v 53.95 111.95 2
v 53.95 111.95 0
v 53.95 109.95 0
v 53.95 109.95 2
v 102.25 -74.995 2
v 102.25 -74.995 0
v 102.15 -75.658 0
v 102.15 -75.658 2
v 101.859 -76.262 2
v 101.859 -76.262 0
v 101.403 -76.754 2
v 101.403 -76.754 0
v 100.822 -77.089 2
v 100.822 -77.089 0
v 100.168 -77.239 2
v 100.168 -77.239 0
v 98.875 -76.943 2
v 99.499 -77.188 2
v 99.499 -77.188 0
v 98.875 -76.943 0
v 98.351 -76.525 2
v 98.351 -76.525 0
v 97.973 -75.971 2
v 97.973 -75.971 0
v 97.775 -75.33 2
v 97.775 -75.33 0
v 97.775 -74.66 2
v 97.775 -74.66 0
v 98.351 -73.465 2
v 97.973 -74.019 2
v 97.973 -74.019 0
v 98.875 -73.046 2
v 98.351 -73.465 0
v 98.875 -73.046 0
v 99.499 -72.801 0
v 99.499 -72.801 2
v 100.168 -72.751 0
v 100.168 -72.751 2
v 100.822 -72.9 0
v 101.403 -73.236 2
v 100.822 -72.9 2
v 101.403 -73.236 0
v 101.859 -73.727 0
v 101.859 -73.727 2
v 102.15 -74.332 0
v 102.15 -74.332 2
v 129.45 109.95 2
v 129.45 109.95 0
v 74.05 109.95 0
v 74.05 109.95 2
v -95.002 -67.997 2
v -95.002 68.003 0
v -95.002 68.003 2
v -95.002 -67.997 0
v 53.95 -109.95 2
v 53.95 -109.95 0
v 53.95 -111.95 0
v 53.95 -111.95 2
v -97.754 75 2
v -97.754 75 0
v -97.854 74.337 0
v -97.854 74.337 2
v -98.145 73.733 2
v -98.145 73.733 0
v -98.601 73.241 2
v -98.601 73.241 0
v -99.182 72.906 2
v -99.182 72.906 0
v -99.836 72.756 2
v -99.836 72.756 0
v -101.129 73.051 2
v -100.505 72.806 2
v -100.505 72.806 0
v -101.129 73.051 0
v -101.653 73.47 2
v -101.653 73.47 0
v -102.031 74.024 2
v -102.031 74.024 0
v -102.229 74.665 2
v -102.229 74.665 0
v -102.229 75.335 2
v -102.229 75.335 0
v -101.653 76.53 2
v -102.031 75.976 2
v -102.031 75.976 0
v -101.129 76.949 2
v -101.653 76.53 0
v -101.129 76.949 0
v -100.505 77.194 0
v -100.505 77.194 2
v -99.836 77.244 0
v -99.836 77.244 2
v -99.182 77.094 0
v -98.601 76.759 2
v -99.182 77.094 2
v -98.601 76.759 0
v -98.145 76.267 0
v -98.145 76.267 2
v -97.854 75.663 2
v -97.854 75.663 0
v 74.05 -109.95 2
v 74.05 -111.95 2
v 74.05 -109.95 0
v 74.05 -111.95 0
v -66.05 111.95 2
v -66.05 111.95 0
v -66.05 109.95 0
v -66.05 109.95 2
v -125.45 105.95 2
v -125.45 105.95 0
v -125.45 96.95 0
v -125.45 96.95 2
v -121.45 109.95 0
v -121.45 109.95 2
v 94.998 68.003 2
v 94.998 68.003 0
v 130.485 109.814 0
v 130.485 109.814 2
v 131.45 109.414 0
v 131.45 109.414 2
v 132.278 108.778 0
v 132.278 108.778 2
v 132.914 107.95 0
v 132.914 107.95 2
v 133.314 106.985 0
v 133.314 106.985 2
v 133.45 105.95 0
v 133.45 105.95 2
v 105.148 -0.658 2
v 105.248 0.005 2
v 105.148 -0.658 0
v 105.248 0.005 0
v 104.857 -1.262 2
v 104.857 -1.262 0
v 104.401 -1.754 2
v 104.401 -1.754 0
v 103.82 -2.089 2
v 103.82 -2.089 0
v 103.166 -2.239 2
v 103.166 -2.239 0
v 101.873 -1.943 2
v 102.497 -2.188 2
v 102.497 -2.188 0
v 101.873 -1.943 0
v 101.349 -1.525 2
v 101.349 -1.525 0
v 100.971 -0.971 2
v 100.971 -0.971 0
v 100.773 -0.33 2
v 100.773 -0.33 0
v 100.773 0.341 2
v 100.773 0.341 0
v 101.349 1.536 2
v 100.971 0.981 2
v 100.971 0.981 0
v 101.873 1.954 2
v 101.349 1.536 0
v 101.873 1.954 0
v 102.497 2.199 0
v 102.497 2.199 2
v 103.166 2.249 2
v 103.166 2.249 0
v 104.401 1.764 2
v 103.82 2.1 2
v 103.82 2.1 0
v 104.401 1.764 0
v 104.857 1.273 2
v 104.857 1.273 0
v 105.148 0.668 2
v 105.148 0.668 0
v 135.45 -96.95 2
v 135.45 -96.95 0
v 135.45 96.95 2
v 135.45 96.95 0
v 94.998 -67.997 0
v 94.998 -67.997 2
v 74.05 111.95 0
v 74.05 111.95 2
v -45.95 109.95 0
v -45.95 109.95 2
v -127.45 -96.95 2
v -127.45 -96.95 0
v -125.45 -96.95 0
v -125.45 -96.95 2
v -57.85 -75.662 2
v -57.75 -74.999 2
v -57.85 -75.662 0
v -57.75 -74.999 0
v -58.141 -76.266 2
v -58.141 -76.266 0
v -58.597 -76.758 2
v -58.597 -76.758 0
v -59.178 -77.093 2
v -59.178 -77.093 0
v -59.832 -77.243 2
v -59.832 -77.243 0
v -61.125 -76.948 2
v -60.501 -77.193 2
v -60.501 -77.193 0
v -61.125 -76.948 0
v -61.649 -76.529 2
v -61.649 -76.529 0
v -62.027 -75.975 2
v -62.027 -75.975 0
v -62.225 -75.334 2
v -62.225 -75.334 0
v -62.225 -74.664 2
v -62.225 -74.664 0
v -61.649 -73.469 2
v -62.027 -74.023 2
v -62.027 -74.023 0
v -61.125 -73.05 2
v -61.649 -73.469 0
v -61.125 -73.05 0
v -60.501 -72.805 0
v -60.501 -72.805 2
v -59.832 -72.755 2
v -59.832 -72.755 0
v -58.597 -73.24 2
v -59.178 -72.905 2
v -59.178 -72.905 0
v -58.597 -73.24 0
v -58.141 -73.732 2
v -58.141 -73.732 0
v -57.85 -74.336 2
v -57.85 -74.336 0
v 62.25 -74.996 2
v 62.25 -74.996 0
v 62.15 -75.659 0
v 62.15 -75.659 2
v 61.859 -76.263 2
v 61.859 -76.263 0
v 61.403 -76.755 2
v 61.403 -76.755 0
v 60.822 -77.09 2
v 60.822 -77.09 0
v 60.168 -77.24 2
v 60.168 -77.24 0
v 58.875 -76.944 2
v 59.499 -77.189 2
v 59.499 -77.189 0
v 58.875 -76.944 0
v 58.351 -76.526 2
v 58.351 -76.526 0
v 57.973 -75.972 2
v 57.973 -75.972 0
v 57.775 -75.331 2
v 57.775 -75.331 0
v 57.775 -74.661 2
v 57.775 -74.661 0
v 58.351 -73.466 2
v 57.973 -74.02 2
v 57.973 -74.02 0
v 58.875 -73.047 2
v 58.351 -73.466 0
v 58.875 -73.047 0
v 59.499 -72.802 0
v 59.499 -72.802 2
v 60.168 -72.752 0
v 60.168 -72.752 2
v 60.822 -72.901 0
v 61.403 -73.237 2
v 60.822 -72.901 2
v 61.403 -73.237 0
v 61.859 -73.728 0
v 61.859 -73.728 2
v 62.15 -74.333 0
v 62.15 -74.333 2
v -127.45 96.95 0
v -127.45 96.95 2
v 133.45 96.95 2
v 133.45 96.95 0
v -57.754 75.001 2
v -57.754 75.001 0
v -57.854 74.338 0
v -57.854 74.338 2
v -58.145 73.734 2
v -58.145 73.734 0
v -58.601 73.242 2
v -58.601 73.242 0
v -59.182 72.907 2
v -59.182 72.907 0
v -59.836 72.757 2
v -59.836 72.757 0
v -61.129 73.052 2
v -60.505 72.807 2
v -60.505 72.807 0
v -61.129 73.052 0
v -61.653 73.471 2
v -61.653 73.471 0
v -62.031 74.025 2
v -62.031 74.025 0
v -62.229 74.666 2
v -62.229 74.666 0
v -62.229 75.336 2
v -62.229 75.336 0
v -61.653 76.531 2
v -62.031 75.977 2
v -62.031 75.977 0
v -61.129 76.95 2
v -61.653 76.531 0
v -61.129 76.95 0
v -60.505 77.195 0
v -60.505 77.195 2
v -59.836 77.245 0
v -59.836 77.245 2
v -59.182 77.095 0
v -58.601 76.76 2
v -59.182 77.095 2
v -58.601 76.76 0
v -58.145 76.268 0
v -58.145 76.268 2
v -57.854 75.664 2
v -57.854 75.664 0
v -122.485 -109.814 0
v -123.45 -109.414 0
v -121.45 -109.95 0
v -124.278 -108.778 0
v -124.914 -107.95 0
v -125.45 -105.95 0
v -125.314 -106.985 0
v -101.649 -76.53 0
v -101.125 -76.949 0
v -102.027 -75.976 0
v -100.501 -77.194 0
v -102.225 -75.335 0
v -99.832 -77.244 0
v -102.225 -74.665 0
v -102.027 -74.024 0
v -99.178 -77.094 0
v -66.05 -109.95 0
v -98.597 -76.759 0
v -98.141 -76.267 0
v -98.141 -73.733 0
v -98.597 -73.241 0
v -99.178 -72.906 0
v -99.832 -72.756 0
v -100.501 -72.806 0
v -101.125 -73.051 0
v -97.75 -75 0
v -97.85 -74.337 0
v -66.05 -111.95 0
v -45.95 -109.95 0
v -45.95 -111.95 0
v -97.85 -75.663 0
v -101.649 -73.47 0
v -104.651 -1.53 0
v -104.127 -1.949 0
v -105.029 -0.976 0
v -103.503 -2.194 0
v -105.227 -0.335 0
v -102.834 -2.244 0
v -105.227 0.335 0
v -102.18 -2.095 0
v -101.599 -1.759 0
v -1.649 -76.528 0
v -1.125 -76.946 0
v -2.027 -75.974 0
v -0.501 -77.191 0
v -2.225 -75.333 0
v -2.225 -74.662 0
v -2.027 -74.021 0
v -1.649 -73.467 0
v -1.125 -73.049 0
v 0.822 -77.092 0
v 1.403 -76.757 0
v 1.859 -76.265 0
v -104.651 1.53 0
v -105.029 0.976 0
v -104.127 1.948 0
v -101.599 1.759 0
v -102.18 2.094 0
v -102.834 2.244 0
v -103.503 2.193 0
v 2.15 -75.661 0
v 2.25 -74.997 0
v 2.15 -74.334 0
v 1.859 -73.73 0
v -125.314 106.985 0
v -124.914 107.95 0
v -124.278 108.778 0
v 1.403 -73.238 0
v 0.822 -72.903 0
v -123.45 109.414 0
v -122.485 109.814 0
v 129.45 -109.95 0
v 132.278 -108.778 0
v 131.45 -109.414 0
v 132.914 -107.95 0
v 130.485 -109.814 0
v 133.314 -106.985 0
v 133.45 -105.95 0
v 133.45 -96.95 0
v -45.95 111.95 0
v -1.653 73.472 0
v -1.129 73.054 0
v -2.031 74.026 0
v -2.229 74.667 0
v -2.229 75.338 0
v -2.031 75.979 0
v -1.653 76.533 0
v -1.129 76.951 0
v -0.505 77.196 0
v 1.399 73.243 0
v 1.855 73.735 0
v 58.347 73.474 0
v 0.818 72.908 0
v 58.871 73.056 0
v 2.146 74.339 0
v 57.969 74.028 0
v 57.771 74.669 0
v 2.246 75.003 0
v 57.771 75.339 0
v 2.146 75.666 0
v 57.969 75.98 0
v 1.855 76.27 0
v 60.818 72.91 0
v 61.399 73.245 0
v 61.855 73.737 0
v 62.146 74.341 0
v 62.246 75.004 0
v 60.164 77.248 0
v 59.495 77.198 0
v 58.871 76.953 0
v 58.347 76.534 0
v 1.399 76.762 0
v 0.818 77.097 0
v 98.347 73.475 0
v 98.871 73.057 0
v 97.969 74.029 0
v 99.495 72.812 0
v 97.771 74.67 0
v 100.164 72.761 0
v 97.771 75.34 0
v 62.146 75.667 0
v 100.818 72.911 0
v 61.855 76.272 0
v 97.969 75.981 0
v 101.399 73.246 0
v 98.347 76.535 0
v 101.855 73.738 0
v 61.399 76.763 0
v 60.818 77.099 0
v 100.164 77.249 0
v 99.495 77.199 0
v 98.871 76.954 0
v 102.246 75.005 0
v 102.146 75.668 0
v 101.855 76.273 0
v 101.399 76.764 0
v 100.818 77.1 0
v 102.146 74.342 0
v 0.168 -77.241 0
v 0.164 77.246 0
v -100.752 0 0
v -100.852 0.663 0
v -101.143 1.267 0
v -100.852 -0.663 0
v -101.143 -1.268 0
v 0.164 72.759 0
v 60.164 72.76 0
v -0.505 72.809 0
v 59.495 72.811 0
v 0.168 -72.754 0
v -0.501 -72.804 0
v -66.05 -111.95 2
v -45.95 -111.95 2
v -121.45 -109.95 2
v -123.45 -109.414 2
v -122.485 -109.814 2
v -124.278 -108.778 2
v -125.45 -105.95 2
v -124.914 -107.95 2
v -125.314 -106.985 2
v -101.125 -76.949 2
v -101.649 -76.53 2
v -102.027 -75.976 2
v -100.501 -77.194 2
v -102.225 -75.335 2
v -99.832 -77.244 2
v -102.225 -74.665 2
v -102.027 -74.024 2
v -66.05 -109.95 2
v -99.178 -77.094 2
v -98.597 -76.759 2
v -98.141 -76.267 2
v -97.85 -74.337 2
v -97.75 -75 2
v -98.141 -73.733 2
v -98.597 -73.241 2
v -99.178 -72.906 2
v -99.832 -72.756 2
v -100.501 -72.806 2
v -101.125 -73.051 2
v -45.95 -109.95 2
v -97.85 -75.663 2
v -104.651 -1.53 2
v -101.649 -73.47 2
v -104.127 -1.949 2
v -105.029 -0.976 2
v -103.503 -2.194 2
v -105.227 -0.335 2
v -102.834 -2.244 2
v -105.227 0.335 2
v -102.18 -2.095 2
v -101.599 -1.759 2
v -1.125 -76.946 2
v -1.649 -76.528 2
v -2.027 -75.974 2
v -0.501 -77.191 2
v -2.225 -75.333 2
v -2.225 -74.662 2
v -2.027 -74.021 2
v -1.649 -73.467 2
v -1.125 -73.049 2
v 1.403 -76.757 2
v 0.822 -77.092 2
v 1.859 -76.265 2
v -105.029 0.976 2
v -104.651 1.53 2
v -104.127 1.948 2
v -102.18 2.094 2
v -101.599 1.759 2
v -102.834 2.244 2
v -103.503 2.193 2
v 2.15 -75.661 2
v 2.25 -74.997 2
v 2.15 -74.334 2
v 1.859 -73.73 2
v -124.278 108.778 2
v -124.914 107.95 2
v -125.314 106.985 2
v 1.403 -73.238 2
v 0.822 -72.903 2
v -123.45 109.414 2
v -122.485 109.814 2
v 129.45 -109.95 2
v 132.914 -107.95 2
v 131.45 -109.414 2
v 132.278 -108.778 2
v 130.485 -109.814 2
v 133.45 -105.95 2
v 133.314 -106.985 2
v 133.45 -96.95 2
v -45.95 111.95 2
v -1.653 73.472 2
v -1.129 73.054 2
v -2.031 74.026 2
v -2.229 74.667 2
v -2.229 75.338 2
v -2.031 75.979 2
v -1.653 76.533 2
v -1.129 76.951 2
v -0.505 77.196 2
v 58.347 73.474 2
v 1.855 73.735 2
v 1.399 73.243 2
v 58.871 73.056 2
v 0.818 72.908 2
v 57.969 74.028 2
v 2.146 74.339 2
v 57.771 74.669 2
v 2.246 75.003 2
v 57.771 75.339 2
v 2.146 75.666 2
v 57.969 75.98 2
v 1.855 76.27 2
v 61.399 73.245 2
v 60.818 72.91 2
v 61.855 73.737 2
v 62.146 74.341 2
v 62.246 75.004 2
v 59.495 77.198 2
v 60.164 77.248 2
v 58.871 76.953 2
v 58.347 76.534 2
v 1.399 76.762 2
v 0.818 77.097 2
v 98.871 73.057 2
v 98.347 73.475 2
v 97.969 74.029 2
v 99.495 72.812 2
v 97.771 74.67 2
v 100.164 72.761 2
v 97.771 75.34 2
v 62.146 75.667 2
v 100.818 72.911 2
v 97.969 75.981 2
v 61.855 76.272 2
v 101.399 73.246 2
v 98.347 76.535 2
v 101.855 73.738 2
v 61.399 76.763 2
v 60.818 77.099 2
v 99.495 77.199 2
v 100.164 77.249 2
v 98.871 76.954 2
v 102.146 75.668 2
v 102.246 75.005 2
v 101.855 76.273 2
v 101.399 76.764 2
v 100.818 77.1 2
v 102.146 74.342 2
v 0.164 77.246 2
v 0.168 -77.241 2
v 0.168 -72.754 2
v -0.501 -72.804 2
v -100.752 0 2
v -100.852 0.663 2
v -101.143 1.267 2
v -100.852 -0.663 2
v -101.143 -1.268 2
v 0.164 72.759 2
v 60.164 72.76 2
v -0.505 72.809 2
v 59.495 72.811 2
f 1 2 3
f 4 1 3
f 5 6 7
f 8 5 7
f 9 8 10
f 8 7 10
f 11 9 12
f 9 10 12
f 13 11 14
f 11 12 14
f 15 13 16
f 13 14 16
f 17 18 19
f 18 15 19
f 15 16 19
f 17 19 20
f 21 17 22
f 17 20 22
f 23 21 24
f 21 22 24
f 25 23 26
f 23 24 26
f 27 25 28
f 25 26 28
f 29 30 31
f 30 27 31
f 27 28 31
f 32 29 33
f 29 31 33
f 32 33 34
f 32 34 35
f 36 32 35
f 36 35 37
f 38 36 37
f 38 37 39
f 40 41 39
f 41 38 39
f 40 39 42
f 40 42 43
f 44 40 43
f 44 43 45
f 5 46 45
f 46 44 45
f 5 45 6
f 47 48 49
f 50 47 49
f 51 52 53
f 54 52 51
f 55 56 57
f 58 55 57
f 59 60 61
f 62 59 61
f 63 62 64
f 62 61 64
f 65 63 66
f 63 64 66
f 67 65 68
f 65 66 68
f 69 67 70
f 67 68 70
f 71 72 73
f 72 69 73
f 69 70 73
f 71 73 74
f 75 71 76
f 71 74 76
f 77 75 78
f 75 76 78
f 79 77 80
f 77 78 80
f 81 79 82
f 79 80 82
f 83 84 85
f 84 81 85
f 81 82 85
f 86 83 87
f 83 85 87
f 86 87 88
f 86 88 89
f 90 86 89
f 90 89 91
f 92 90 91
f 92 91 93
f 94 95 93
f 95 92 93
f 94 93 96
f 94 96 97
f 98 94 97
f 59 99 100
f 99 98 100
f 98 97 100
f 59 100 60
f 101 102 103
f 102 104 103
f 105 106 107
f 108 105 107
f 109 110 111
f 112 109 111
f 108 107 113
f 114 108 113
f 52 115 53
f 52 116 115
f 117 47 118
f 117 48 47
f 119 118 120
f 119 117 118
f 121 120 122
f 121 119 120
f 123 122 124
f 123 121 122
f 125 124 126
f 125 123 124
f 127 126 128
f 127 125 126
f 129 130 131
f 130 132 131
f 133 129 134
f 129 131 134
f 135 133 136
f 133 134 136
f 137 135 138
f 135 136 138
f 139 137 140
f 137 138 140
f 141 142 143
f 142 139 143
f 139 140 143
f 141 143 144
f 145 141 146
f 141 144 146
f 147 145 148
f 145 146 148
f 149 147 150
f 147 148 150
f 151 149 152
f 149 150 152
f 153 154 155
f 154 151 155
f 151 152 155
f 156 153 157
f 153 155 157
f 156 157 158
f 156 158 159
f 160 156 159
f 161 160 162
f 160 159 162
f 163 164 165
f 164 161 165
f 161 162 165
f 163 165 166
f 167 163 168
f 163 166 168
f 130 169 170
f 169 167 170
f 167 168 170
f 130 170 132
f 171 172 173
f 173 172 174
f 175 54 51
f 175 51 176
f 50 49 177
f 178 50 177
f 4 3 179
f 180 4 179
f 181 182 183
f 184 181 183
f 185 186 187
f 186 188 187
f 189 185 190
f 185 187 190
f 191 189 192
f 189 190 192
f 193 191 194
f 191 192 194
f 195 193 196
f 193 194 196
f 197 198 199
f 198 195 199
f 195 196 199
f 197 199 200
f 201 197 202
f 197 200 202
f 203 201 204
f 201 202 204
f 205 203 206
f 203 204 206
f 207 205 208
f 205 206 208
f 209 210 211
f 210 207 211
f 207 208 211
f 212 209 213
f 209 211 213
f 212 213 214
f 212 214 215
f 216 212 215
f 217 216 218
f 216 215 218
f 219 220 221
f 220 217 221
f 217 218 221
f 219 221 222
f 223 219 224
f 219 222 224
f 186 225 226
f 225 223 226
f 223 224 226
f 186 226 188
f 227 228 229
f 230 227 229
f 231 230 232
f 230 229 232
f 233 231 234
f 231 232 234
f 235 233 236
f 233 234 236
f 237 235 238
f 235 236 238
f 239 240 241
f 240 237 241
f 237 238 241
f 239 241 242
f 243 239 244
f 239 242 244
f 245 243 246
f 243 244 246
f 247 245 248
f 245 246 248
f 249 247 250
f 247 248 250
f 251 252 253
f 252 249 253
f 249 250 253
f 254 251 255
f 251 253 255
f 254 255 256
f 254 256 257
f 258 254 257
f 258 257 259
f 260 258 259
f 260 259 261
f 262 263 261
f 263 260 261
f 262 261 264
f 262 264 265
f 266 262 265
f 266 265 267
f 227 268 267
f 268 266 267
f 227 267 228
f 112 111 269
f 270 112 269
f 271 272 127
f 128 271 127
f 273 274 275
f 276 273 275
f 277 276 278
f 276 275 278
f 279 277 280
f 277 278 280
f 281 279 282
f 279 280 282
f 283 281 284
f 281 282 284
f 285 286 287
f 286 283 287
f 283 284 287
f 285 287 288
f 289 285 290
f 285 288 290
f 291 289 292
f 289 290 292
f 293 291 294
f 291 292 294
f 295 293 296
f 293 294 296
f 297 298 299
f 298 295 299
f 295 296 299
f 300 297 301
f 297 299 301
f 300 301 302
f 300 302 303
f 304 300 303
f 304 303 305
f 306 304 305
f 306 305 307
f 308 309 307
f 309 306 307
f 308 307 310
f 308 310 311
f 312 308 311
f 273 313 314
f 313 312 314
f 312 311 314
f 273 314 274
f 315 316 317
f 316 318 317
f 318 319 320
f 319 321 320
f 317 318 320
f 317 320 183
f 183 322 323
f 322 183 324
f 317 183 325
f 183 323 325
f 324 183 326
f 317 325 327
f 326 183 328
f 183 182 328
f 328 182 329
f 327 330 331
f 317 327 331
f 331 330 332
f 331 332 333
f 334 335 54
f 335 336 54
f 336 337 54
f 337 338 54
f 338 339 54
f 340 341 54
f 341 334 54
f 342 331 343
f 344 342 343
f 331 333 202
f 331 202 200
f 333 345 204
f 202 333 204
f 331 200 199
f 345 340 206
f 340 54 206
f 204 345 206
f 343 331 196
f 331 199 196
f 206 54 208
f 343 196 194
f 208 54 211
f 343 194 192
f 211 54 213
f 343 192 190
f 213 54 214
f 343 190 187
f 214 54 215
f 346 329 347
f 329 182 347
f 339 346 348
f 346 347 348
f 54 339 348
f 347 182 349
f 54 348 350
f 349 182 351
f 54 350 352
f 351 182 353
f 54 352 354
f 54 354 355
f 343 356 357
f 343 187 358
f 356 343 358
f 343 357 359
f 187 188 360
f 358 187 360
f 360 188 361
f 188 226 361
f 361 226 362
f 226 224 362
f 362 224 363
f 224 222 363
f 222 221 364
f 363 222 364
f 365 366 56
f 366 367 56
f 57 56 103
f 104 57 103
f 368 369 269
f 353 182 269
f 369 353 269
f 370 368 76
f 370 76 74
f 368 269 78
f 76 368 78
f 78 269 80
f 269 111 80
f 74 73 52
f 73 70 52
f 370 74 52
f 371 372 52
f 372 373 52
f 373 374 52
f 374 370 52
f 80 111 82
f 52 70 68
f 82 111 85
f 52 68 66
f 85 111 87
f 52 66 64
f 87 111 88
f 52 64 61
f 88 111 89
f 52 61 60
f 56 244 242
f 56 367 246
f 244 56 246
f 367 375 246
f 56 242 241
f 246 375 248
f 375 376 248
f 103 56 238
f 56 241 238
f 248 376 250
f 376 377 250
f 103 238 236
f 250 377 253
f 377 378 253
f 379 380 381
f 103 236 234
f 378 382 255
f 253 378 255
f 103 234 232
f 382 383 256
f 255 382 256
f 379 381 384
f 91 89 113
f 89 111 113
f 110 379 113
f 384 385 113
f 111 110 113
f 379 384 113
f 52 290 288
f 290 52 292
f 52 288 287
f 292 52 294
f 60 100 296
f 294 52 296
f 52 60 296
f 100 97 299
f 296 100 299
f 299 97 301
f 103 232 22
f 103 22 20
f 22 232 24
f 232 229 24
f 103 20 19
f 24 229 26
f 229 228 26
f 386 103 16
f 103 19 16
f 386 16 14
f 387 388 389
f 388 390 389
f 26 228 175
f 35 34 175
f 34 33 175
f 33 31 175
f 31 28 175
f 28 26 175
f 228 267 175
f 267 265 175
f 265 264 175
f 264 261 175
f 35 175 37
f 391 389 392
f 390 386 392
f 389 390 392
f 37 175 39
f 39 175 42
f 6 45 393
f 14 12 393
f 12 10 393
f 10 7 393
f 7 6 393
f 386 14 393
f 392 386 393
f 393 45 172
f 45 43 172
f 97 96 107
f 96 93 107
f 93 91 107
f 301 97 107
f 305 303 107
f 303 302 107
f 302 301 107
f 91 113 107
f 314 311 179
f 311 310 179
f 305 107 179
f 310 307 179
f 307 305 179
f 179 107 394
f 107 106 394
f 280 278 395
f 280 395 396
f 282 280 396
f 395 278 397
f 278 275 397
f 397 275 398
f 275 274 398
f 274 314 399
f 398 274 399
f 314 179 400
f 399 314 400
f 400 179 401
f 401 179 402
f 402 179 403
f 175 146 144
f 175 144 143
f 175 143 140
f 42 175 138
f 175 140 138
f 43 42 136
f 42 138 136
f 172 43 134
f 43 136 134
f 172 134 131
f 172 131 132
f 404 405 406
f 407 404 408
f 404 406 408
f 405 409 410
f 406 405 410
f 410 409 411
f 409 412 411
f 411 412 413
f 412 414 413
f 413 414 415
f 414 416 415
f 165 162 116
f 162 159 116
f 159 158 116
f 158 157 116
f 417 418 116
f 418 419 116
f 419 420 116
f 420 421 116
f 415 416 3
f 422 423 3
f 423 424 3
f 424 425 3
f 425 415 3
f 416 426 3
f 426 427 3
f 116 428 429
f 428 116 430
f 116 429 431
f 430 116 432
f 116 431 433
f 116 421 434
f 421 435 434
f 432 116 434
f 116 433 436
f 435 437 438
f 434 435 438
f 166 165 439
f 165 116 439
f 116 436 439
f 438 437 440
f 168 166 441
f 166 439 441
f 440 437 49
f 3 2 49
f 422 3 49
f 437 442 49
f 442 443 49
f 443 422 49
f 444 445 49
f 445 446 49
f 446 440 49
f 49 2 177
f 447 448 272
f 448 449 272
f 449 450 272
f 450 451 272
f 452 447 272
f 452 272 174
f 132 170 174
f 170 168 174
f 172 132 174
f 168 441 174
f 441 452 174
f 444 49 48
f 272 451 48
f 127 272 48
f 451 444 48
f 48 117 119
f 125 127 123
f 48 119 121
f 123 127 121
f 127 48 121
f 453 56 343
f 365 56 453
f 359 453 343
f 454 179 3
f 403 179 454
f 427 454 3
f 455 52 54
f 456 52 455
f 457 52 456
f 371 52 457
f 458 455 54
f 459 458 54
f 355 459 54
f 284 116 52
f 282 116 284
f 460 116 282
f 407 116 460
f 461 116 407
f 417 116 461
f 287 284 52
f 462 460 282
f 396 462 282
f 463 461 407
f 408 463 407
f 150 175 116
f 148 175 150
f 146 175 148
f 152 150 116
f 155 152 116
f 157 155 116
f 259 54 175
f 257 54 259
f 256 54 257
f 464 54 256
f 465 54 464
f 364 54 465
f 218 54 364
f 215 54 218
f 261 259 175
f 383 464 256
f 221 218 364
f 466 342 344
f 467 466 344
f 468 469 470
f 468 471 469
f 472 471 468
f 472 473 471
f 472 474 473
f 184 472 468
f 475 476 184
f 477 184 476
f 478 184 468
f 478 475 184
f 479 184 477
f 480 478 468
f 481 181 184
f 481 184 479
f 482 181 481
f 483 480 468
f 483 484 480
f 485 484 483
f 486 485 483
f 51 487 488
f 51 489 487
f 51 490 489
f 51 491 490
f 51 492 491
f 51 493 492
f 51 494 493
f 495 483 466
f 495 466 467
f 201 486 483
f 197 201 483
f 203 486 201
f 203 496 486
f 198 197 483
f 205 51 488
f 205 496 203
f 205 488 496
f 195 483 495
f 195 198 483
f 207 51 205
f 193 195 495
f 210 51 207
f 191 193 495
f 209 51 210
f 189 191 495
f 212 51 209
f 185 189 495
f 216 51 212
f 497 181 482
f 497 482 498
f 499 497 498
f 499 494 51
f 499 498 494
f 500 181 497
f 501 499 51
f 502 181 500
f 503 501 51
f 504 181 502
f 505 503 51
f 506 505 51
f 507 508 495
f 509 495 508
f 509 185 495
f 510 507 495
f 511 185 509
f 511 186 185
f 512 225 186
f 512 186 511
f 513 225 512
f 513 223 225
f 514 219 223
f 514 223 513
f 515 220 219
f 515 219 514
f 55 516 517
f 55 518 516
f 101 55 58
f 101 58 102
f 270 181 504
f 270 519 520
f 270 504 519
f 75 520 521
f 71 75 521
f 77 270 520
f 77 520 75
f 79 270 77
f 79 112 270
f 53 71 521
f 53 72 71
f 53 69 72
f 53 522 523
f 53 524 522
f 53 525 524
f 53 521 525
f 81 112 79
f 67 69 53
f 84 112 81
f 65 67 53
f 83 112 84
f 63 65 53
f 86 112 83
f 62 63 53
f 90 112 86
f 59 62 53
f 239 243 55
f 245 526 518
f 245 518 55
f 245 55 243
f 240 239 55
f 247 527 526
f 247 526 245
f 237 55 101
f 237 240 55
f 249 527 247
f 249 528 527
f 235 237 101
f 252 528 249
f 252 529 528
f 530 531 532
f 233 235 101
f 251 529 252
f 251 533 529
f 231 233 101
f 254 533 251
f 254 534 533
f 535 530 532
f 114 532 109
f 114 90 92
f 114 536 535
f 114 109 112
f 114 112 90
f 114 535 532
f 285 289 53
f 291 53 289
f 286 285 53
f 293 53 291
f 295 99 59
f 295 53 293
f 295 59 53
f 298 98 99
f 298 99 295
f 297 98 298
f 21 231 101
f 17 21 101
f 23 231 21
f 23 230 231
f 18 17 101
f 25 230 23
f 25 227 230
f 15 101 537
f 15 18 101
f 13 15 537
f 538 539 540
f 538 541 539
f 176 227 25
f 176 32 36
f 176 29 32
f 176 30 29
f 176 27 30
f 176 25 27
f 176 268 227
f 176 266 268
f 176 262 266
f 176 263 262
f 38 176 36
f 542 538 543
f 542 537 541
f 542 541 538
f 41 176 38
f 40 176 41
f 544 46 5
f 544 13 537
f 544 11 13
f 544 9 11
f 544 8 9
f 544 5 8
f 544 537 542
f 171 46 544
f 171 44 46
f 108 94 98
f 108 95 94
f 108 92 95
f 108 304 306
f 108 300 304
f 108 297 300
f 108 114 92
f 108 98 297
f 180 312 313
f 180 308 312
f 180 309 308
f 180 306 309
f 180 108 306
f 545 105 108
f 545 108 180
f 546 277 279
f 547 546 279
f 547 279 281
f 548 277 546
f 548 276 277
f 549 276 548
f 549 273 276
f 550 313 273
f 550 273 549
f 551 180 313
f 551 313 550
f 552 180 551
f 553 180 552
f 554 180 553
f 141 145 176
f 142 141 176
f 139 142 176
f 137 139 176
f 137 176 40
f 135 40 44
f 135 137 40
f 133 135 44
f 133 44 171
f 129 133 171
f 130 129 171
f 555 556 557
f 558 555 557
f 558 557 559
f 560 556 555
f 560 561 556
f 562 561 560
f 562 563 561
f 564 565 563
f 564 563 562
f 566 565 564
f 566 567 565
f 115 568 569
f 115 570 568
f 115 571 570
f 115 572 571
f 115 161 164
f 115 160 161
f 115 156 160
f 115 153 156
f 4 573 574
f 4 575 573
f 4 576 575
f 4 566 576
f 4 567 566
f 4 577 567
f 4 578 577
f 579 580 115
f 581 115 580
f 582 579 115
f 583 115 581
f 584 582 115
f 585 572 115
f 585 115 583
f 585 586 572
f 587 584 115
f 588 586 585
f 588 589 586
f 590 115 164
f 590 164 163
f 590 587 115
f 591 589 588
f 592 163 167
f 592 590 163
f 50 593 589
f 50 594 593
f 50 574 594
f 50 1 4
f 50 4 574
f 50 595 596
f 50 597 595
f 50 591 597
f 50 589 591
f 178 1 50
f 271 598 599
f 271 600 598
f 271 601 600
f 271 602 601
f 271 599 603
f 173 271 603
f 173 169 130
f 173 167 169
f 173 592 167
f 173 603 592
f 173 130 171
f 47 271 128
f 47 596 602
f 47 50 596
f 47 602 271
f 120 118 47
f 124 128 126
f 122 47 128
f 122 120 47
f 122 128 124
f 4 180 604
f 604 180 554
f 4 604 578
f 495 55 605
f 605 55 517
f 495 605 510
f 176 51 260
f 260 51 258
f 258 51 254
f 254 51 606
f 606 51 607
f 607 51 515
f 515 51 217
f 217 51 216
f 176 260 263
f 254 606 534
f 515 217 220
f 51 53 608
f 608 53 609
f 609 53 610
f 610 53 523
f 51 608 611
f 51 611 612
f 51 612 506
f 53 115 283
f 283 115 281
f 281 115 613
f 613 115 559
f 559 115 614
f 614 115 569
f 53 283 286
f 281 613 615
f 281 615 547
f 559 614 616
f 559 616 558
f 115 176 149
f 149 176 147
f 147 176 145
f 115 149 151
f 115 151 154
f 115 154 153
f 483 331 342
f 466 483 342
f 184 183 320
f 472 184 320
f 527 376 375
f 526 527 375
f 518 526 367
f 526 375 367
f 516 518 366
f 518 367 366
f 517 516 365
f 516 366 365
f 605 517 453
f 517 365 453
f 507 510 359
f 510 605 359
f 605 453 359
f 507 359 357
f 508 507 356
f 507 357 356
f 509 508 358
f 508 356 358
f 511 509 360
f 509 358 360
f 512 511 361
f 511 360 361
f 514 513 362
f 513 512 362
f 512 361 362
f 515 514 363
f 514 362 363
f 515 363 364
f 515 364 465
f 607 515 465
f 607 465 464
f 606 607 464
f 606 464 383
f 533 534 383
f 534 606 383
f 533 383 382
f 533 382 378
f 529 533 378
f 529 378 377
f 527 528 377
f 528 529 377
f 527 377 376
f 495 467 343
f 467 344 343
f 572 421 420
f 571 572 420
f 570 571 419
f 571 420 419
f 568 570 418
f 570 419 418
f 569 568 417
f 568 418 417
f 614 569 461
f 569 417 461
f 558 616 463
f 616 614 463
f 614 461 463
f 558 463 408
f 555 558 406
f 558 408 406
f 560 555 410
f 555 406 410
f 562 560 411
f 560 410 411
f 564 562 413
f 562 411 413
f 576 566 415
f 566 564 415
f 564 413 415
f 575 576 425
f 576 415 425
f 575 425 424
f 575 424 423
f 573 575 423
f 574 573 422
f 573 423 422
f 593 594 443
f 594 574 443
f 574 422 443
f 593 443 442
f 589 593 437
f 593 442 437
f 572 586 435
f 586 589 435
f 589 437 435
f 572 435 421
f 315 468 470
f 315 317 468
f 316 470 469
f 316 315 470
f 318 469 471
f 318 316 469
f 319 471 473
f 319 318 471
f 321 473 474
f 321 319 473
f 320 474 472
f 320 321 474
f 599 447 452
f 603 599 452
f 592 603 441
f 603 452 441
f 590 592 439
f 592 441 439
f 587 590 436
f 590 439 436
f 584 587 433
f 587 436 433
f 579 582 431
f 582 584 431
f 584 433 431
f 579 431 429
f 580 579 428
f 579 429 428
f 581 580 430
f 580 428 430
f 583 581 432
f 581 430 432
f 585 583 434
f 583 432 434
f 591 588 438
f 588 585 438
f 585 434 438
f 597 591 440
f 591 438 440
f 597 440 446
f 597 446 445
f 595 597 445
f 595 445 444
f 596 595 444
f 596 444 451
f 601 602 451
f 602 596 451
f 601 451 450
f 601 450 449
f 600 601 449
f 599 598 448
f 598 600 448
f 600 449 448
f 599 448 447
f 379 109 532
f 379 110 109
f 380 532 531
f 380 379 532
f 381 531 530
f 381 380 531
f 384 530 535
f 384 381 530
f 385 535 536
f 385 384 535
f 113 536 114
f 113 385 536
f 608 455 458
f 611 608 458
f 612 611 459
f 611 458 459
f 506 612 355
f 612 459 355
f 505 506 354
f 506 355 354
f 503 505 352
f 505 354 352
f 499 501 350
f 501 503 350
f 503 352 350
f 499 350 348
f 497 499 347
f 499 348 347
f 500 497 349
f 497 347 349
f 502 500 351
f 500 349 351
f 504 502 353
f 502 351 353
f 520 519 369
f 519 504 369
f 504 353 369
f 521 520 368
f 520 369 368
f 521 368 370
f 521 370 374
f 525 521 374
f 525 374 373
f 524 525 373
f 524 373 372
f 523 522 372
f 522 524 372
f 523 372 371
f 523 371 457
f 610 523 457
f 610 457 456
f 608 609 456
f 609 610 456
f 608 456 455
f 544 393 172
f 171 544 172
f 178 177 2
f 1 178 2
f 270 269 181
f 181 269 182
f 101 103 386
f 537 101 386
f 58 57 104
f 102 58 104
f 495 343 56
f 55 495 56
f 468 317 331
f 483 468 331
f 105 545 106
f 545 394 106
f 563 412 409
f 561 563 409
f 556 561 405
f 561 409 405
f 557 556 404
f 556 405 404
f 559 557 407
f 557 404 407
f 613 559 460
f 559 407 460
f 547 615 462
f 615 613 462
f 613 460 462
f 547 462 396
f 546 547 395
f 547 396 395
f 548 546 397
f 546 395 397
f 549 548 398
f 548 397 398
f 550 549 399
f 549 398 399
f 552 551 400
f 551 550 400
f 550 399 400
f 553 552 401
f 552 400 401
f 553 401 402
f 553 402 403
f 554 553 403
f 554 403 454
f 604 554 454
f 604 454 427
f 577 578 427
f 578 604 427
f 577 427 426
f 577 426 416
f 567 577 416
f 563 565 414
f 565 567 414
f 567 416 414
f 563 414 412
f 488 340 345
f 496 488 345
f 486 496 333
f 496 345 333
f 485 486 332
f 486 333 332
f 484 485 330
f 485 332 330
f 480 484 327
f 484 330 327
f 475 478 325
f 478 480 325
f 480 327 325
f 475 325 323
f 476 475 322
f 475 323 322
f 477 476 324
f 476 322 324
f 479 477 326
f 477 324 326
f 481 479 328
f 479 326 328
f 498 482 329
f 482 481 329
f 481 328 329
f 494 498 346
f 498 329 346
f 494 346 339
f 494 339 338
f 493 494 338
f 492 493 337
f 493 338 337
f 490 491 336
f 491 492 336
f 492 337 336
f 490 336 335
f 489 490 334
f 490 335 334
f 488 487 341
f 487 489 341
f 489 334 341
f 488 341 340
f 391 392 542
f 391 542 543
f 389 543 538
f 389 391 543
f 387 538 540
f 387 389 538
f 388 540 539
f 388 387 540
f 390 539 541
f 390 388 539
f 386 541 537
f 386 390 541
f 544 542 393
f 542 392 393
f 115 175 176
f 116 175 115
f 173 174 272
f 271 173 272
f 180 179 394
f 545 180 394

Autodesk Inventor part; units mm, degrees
ref_plane "YZ Plane" through (0, 0, 0) normal (1, 0, 0) x (0, 1, 0)
ref_plane "XZ Plane" through (0, 0, 0) normal (0, 1, 0) x (-1, 0, 0)
ref_plane "XY Plane" through (0, 0, 0) normal (0, 0, 1) x (1, 0, 0)
ref_plane "Arbeitsebene1" through (0, 0, 0) normal (0, 0, 1) x (1, 0, 0)
sketch "Skizze1" plane through (0, 0, 0) normal (0, 0, 1) x (1, 0, 0)
  line L0 (53.9, 111.9999) -> (53.9, 109.9999) construction
  line L1 (53.9, 109.9999) -> (-45.9, 109.9999) construction
  line L2 (-45.9, 109.9999) -> (-45.9, 111.9999) construction
  line L3 (-66.1, 111.9999) -> (-66.1, 109.9999) construction
  line L4 (-66.1, 109.9999) -> (-123.5, 109.9999) construction
  arc A0 (-123.5, 109.9999) -> (-125.5, 107.9999) centre (-123.5, 107.9999) ccw construction
  line L5 (-125.5, 107.9999) -> (-125.5, 96.9999) construction
  line L6 (-125.5, 96.9999) -> (-127.5, 96.9999) construction
  line L7 (133.5, 96.9999) -> (133.5, 107.9999) construction
  arc A1 (133.5, 107.9999) -> (131.5, 109.9999) centre (131.5, 107.9999) ccw construction
  line L8 (131.5, 109.9999) -> (74.1, 109.9999) construction
  line L9 (74.1, 109.9999) -> (74.1, 111.9999) construction
  line L10 (135.5, 96.9999) -> (133.5, 96.9999) construction
  line L11 (-45.9, -111.9999) -> (-45.9, -109.9999) construction
  line L12 (-45.9, -109.9999) -> (53.9, -109.9999) construction
  line L13 (53.9, -109.9999) -> (53.9, -111.9999) construction
  line L14 (74.1, -111.9999) -> (74.1, -109.9999) construction
  line L15 (74.1, -109.9999) -> (131.5, -109.9999) construction
  arc A2 (131.5, -109.9999) -> (133.5, -107.9999) centre (131.5, -107.9999) ccw construction
  line L16 (133.5, -107.9999) -> (133.5, -96.9999) construction
  line L17 (133.5, -96.9999) -> (135.5, -96.9999) construction
  line L18 (-125.5, -96.9999) -> (-125.5, -107.9999) construction
  arc A3 (-125.5, -107.9999) -> (-123.5, -109.9999) centre (-123.5, -107.9999) ccw construction
  line L19 (-123.5, -109.9999) -> (-66.1, -109.9999) construction
  line L20 (-66.1, -109.9999) -> (-66.1, -111.9999) construction
  line L21 (-127.5, -96.9999) -> (-125.5, -96.9999) construction
  line L22 (135.5, -96.9999) -> (135.5, 96.9999) construction
  line L23 (74.1, 111.9999) -> (53.9, 111.9999) construction
  line L24 (-45.9, 111.9999) -> (-66.1, 111.9999) construction
  line L25 (-127.5, 96.9999) -> (-127.5, -96.9999) construction
  line L26 (-127.5, -109.9999) -> (-127.5, -111.9999) construction
  line L27 (-66.1, -111.9999) -> (-45.9, -111.9999) construction
  line L28 (53.9, -111.9999) -> (74.1, -111.9999) construction
  line L29 (135.45, 96.9499) -> (133.45, 96.9499)
  line L30 (133.45, 96.9499) -> (133.45, 107.9999)
  arc A4 (133.45, 107.9999) -> (131.5, 109.9499) centre (131.5, 107.9999) ccw
  line L31 (131.5, 109.9499) -> (74.05, 109.9499)
  line L32 (74.05, 109.9499) -> (74.05, 111.9499)
  line L33 (74.05, 111.9499) -> (53.95, 111.9499)
  line L34 (53.95, 111.9499) -> (53.95, 109.9499)
  line L35 (53.95, 109.9499) -> (-45.95, 109.9499)
  line L36 (-45.95, 109.9499) -> (-45.95, 111.9499)
  line L37 (-45.95, 111.9499) -> (-66.05, 111.9499)
  line L38 (-66.05, 111.9499) -> (-66.05, 109.9499)
  line L39 (-66.05, 109.9499) -> (-123.5, 109.9499)
  arc A5 (-123.5, 109.9499) -> (-125.45, 107.9999) centre (-123.5, 107.9999) ccw
  line L40 (-125.45, 107.9999) -> (-125.45, 96.9499)
  line L41 (-125.45, 96.9499) -> (-127.45, 96.9499)
  line L42 (-127.45, 96.9499) -> (-127.45, -96.9499)
  line L43 (-127.45, -96.9499) -> (-125.45, -96.9499)
  line L44 (-125.45, -96.9499) -> (-125.45, -107.9999)
  arc A6 (-125.45, -107.9999) -> (-123.5, -109.9499) centre (-123.5, -107.9999) ccw
  line L45 (-123.5, -109.9499) -> (-66.05, -109.9499)
  line L46 (-66.05, -109.9499) -> (-66.05, -111.9499)
  line L47 (-66.05, -111.9499) -> (-45.95, -111.9499)
  line L48 (-45.95, -111.9499) -> (-45.95, -109.9499)
  line L49 (-45.95, -109.9499) -> (53.95, -109.9499)
  line L50 (53.95, -109.9499) -> (53.95, -111.9499)
  line L51 (53.95, -111.9499) -> (74.05, -111.9499)
  line L52 (74.05, -111.9499) -> (74.05, -109.9499)
  line L53 (74.05, -109.9499) -> (131.5, -109.9499)
  arc A7 (131.5, -109.9499) -> (133.45, -107.9999) centre (131.5, -107.9999) ccw
  line L54 (133.45, -107.9999) -> (133.45, -96.9499)
  line L55 (133.45, -96.9499) -> (135.45, -96.9499)
  line L56 (135.45, -96.9499) -> (135.45, 96.9499)
  circle A8 centre (99.9961, 75.0051) radius 2.25
  circle A9 centre (59.9961, 75.0041) radius 2.25
  circle A10 centre (102.9981, 0.0052) radius 2.25
  circle A11 centre (100, -74.9949) radius 2.25
  circle A12 centre (60, -74.9959) radius 2.25
  circle A13 centre (0, -74.9974) radius 2.25
  circle A14 centre (-60, -74.999) radius 2.25
  circle A15 centre (-100, -75) radius 2.25
  circle A16 centre (-100.0039, 75) radius 2.25
  circle A17 centre (-60.0039, 75.001) radius 2.25
  circle A18 centre (-0.0039, 75.0026) radius 2.25
  line L57 (100, -74.9949) -> (-100.0039, 75) construction
  line L58 (-100.0039, 75) -> (99.9961, 75.0051) construction
  line L59 (99.9961, 75.0051) -> (-100, -75) construction
  line L60 (94.9981, 68.0026) -> (-95.0019, 68.0026)
  line L61 (-95.0019, 68.0026) -> (-95.0019, -67.9974)
  line L62 (-95.0019, -67.9974) -> (94.9981, -67.9974)
  line L63 (94.9981, -67.9974) -> (94.9981, 68.0026)
  line L64 (94.9981, 68.0026) -> (-95.0019, -67.9974) construction
  line L65 (-95.0019, 68.0026) -> (94.9981, -67.9974) construction
  circle A19 centre (-103.0019, -0.0001) radius 2.25
  point P0 (0, 0)
  point P1 (-0.0019, 0.0026)
  dimension "d0" = 0.05
  dimension "d1" = 190
  dimension "d2" = 136
extrude "Grobblech1" add sketch "Skizze1" along normal blind 2
sketch "Skizze2" plane through (0, 0, 0) normal (0, 0, -1) x (-1, 0, 0)
  arc A0 (121.45, -109.9499) -> (125.45, -105.9499) centre (121.45, -105.9499) ccw
  line L0 (-94.9981, -67.9974) -> (-94.9981, 68.0026) projected
  line L1 (-94.9981, 68.0026) -> (95.0019, 68.0026) projected
  line L2 (95.0019, 68.0026) -> (95.0019, -67.9974) projected
  line L3 (95.0019, -67.9974) -> (-94.9981, -67.9974) projected
  circle A1 centre (103.0019, -0.0001) radius 2.25 projected
  circle A2 centre (0.0039, 75.0026) radius 2.25 projected
  circle A3 centre (60.0039, 75.001) radius 2.25 projected
  circle A4 centre (100.0039, 75) radius 2.25 projected
  circle A5 centre (100, -75) radius 2.25 projected
  circle A6 centre (60, -74.999) radius 2.25 projected
  circle A7 centre (0, -74.9974) radius 2.25 projected
  circle A8 centre (-60, -74.9959) radius 2.25 projected
  circle A9 centre (-100, -74.9949) radius 2.25 projected
  circle A10 centre (-102.9981, 0.0052) radius 2.25 projected
  circle A11 centre (-59.9961, 75.0041) radius 2.25 projected
  circle A12 centre (-99.9961, 75.0051) radius 2.25 projected
  line L4 (-135.45, 96.9499) -> (-133.45, 96.9499) projected
  line L5 (-135.45, -96.9499) -> (-135.45, 96.9499) projected
  line L6 (-133.45, -96.9499) -> (-135.45, -96.9499) projected
  line L7 (-133.45, -107.9999) -> (-133.45, -96.9499) projected
  arc A13 (-133.45, -107.9999) -> (-131.5, -109.9499) centre (-131.5, -107.9999) ccw projected
  line L8 (-74.05, -109.9499) -> (-131.5, -109.9499) projected
  line L9 (-74.05, -111.9499) -> (-74.05, -109.9499) projected
  line L10 (-53.95, -111.9499) -> (-74.05, -111.9499) projected
  line L11 (-53.95, -109.9499) -> (-53.95, -111.9499) projected
  line L12 (45.95, -109.9499) -> (-53.95, -109.9499) projected
  line L13 (45.95, -111.9499) -> (45.95, -109.9499) projected
  line L14 (66.05, -111.9499) -> (45.95, -111.9499) projected
  line L15 (66.05, -109.9499) -> (66.05, -111.9499) projected
  line L16 (123.5, -109.9499) -> (66.05, -109.9499) projected
  arc A14 (123.5, -109.9499) -> (125.45, -107.9999) centre (123.5, -107.9999) ccw projected
  line L17 (125.45, -96.9499) -> (125.45, -107.9999) projected
  line L18 (127.45, -96.9499) -> (125.45, -96.9499) projected
  line L19 (127.45, 96.9499) -> (127.45, -96.9499) projected
  line L20 (125.45, 96.9499) -> (127.45, 96.9499) projected
  line L21 (125.45, 107.9999) -> (125.45, 96.9499) projected
  arc A15 (125.45, 107.9999) -> (123.5, 109.9499) centre (123.5, 107.9999) ccw projected
  line L22 (66.05, 109.9499) -> (123.5, 109.9499) projected
  line L23 (66.05, 111.9499) -> (66.05, 109.9499) projected
  line L24 (45.95, 111.9499) -> (66.05, 111.9499) projected
  line L25 (45.95, 109.9499) -> (45.95, 111.9499) projected
  line L26 (-53.95, 109.9499) -> (45.95, 109.9499) projected
  line L27 (-53.95, 111.9499) -> (-53.95, 109.9499) projected
  line L28 (-74.05, 111.9499) -> (-53.95, 111.9499) projected
  line L29 (-74.05, 109.9499) -> (-74.05, 111.9499) projected
  line L30 (-131.5, 109.9499) -> (-74.05, 109.9499) projected
  arc A16 (-131.5, 109.9499) -> (-133.45, 107.9999) centre (-131.5, 107.9999) ccw projected
  line L31 (-133.45, 96.9499) -> (-133.45, 107.9999) projected
  arc A17 (125.45, 105.9499) -> (121.45, 109.9499) centre (121.45, 105.9499) ccw
  arc A18 (-129.45, 109.9499) -> (-133.45, 105.9499) centre (-129.45, 105.9499) ccw
  line L32 (-133.45, 96.9499) -> (-133.45, 107.9999) projected
  arc A19 (-133.45, -105.9499) -> (-129.45, -109.9499) centre (-129.45, -105.9499) ccw
  line L33 (-133.45, -107.9999) -> (-133.45, -96.9499) projected
  line L34 (-74.05, -109.9499) -> (-131.5, -109.9499) projected
  point P0 (0, 0)
  dimension "d4" = 8
  dimension "d5" = 8
  dimension "d6" = 8
  dimension "d7" = 8
extrude "Extrusion1" cut sketch "Skizze2" against normal through all contours A0 L17 A14 L16 | A17 L22 A15 L21 | L8 A13 L7 A19 | L31 A16 L30 A18
equation "\"d3\" = Stärke"
equation "\"Biegeradius\" = Stärke"
equation "\"BreiteBiegungsfreistellung\" = Stärke"
equation "\"TiefeBiegungsfreistellung\" = 0.5 * Stärke"
equation "\"GrößeEckenfreistellung\" = 4 * Stärke"
equation "\"MinimalRest\" = 2 * Stärke"
equation "\"Übergangsradius\" = Biegeradius"
equation "\"JacobiRadiusGröße\" = Biegeradius"
equation "\"Abstandsgröße\" = Stärke"
equation "\"Stärke\" = 2"
properties part number "BrennerHalter"
